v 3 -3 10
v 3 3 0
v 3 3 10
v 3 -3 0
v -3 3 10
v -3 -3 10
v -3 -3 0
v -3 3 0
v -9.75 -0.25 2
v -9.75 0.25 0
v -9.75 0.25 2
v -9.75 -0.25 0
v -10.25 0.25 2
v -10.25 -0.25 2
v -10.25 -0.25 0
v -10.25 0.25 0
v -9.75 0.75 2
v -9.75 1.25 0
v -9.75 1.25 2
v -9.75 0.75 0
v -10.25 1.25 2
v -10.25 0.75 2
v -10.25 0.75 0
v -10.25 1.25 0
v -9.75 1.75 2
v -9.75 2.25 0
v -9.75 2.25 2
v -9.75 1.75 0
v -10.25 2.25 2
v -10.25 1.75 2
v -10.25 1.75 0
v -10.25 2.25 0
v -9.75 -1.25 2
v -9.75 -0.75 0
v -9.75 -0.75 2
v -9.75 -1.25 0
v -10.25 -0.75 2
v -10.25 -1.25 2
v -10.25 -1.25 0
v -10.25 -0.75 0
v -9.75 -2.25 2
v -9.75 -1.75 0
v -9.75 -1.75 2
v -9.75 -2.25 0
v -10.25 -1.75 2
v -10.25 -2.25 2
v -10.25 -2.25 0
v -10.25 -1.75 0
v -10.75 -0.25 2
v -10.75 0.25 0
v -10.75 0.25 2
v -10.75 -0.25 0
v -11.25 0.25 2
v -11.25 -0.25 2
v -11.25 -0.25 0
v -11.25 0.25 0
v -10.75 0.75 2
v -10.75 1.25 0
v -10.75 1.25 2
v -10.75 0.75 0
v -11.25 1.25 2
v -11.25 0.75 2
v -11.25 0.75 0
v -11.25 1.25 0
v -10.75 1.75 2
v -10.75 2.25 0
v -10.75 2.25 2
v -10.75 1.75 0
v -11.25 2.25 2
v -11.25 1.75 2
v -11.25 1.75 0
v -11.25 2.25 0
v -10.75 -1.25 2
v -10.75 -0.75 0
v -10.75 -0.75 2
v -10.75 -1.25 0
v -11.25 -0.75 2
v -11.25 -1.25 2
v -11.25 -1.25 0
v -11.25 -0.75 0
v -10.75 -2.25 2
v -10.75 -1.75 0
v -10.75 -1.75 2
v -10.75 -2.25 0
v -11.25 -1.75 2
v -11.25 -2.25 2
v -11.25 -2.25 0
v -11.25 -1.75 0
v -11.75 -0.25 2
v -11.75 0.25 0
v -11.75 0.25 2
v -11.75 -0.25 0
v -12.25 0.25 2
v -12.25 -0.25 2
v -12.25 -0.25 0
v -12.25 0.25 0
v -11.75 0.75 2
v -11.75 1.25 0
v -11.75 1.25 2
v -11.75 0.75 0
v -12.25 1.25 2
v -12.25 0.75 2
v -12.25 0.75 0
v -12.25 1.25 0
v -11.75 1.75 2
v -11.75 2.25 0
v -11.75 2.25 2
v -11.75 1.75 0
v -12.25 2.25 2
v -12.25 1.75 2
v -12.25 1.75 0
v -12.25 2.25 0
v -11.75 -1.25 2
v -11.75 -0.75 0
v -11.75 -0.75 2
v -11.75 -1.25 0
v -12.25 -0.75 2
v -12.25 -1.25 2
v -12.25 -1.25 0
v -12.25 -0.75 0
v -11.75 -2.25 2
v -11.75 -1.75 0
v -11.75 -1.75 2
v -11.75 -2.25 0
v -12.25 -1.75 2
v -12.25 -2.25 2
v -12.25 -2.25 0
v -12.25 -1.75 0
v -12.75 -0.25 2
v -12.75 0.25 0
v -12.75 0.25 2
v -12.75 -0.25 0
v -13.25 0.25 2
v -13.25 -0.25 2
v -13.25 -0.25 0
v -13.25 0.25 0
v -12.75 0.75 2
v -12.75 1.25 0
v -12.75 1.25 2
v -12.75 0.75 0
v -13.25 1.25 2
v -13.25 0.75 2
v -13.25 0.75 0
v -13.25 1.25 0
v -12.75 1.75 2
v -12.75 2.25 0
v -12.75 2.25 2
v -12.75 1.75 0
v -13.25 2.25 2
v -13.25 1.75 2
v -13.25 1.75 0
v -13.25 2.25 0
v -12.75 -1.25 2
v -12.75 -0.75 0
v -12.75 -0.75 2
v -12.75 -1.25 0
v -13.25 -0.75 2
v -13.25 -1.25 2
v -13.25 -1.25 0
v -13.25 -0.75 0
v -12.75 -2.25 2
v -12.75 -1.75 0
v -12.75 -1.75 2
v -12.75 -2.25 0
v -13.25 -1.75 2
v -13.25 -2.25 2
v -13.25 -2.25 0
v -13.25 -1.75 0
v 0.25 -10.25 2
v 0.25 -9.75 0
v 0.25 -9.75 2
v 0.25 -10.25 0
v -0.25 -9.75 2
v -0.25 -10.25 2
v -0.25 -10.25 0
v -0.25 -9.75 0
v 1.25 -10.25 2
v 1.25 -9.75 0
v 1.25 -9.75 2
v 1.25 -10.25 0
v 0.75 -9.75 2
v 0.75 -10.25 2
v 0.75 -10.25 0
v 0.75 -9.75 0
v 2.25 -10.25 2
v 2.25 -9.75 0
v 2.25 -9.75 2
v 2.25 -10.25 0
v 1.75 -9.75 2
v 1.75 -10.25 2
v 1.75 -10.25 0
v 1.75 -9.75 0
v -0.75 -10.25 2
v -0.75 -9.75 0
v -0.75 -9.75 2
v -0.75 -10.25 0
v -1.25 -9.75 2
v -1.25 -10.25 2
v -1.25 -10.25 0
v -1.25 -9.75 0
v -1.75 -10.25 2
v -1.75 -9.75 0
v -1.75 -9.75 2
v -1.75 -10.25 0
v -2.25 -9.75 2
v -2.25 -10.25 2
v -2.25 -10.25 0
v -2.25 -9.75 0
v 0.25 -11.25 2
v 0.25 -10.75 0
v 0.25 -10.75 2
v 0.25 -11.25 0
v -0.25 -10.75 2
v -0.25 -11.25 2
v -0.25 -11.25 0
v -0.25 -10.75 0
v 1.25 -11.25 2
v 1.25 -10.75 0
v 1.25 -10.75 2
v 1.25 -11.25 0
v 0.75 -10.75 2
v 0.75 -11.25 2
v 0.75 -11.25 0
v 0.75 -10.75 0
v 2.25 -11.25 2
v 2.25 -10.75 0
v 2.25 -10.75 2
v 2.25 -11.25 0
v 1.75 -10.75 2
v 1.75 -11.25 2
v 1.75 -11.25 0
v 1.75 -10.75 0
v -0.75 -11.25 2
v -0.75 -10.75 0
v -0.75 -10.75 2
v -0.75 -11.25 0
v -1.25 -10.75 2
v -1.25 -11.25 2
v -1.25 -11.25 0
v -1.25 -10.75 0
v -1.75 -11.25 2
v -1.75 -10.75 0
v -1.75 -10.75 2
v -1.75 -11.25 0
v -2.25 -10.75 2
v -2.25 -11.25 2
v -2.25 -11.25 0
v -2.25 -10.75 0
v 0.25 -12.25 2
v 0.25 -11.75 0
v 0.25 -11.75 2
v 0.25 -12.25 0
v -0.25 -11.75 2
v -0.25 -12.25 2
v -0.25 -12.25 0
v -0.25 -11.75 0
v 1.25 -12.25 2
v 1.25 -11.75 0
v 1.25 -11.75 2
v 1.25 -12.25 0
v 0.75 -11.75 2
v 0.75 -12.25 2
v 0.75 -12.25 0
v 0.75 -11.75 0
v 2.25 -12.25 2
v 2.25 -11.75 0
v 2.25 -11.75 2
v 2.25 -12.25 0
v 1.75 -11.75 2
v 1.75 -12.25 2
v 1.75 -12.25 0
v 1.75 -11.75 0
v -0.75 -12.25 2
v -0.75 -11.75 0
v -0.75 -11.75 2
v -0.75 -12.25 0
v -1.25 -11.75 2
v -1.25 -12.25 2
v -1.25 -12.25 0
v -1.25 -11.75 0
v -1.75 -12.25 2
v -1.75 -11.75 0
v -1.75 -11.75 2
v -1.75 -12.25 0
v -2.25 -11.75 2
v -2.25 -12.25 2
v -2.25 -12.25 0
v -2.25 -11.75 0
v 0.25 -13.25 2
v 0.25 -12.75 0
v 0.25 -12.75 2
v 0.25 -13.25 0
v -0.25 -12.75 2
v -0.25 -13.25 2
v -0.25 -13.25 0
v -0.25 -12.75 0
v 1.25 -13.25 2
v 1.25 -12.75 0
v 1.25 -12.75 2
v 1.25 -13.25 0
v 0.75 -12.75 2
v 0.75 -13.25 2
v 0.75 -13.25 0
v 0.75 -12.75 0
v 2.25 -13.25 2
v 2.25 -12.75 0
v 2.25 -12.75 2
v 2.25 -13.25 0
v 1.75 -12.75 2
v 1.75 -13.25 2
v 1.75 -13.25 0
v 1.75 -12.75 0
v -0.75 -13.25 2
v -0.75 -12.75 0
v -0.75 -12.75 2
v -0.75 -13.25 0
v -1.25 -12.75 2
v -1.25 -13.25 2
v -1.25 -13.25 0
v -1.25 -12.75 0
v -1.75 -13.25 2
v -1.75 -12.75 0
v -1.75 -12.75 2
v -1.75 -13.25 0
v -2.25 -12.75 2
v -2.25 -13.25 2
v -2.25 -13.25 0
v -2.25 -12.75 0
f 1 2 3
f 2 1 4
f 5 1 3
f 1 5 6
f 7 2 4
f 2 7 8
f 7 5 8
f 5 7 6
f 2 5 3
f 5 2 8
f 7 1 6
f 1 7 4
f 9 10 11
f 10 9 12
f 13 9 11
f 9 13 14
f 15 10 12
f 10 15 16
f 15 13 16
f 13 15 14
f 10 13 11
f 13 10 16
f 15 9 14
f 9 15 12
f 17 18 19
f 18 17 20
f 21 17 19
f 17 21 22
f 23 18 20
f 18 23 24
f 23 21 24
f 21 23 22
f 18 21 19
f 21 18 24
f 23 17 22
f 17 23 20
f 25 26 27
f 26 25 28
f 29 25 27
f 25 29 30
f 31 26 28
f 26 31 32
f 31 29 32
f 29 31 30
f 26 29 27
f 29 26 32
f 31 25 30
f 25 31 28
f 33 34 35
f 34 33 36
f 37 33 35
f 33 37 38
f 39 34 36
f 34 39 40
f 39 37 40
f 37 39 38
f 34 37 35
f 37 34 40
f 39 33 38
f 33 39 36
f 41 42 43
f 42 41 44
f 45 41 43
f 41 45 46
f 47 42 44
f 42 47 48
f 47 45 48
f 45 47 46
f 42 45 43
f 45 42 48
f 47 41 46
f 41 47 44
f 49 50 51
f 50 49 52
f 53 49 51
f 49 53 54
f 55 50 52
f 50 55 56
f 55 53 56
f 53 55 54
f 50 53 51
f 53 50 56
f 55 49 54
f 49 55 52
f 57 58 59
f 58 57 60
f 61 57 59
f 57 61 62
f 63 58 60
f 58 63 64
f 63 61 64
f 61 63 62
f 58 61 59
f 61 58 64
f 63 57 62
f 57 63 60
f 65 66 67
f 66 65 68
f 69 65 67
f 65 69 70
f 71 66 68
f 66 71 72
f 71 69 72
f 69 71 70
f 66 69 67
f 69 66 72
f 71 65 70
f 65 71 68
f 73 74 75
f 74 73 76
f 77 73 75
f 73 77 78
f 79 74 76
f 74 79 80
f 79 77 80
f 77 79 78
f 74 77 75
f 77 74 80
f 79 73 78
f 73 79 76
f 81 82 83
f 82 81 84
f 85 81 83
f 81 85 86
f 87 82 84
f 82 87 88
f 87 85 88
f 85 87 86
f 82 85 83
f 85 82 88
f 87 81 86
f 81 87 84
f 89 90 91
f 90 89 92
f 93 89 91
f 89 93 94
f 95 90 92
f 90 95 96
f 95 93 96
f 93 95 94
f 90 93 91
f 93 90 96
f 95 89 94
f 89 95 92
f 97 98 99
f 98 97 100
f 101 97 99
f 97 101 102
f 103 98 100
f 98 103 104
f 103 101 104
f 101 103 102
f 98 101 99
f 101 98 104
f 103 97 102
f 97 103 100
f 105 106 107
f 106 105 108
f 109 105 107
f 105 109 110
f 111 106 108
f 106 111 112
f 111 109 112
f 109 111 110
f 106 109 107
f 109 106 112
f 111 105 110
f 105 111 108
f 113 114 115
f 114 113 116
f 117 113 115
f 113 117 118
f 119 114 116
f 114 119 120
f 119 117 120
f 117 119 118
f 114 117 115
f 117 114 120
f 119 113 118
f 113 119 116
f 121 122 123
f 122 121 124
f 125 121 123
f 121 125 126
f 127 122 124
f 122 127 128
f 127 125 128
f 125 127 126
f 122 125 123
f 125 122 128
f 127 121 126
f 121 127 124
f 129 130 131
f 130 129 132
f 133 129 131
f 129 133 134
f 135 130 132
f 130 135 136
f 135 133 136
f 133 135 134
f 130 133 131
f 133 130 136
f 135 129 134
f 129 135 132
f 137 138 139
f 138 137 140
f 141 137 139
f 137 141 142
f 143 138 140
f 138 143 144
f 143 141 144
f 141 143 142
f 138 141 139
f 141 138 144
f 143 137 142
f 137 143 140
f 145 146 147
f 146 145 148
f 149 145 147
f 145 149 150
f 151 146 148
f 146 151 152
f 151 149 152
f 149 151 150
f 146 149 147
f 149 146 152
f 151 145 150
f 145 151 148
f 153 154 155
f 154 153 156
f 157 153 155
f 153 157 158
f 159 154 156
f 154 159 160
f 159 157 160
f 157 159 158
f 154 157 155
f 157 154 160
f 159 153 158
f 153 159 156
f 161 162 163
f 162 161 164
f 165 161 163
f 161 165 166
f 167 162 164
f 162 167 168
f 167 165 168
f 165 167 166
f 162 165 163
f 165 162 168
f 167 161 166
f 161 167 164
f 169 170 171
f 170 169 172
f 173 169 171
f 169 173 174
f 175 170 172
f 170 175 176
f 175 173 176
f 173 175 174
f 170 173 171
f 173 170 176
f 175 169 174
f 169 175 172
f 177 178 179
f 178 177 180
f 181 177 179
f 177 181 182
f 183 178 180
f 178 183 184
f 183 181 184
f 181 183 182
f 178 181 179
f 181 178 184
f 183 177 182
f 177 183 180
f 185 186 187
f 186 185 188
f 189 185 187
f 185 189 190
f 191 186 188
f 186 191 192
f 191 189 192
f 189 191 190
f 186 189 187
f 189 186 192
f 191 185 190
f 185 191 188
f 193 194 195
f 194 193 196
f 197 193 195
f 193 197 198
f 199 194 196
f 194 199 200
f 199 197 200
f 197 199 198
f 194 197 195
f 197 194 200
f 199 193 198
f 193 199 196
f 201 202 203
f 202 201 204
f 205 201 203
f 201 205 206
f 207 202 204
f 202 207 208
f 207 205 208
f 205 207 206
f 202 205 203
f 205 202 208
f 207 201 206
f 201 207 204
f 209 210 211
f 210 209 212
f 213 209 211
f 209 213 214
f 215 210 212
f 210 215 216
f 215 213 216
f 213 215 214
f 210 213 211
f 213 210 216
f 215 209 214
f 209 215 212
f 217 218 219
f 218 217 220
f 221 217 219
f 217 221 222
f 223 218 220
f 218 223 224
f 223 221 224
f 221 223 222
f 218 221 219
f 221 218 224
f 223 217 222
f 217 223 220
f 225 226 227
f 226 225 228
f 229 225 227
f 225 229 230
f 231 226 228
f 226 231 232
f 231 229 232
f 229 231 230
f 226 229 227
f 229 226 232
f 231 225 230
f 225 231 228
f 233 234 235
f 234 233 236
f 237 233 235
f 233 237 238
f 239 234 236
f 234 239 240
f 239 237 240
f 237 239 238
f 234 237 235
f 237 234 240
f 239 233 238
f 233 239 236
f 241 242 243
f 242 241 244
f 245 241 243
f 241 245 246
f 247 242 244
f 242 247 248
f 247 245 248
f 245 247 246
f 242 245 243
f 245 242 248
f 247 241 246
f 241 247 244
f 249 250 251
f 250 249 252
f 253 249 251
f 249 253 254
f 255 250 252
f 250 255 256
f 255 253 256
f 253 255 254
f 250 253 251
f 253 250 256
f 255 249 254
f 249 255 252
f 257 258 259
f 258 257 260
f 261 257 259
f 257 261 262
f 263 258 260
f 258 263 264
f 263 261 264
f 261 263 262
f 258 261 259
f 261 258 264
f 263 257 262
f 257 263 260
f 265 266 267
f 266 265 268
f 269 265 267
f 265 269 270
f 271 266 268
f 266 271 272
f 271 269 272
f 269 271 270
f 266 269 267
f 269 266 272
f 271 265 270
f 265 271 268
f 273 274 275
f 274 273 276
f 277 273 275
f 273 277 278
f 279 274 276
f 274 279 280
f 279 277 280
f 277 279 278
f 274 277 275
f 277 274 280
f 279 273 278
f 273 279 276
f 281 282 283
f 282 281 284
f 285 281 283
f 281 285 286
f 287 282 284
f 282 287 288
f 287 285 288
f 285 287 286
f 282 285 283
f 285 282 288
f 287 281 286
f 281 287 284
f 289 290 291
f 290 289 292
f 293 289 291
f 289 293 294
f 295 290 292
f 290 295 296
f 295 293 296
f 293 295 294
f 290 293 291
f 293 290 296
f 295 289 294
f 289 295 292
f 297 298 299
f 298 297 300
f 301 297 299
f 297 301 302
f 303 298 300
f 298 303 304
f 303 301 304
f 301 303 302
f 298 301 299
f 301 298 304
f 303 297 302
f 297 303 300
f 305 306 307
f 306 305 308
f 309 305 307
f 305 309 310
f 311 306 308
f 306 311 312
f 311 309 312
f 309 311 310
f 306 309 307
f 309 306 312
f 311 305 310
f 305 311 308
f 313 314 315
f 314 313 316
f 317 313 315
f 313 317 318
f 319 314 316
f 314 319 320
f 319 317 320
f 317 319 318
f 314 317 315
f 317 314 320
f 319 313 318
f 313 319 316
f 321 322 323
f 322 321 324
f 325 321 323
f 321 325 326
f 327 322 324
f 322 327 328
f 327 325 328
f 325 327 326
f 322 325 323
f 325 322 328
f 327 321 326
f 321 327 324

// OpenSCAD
translate([0, 0, 5]) color([0,1,0,0.9]) cube([6, 6, 10], center=true);
translate([-10, 0, 1]) color([1,0,0]) cube([0.5, 0.5, 2], center=true);
translate([-10, 1, 1]) color([1,0,0]) cube([0.5, 0.5, 2], center=true);
translate([-10, 2, 1]) color([1,0,0]) cube([0.5, 0.5, 2], center=true);
translate([-10, -1, 1]) color([1,0,0]) cube([0.5, 0.5, 2], center=true);
translate([-10, -2, 1]) color([1,0,0]) cube([0.5, 0.5, 2], center=true);
translate([-11, 0, 1]) color([1,0,0]) cube([0.5, 0.5, 2], center=true);
translate([-11, 1, 1]) color([1,0,0]) cube([0.5, 0.5, 2], center=true);
translate([-11, 2, 1]) color([1,0,0]) cube([0.5, 0.5, 2], center=true);
translate([-11, -1, 1]) color([1,0,0]) cube([0.5, 0.5, 2], center=true);
translate([-11, -2, 1]) color([1,0,0]) cube([0.5, 0.5, 2], center=true);
translate([-12, 0, 1]) color([1,0,0]) cube([0.5, 0.5, 2], center=true);
translate([-12, 1, 1]) color([1,0,0]) cube([0.5, 0.5, 2], center=true);
translate([-12, 2, 1]) color([1,0,0]) cube([0.5, 0.5, 2], center=true);
translate([-12, -1, 1]) color([1,0,0]) cube([0.5, 0.5, 2], center=true);
translate([-12, -2, 1]) color([1,0,0]) cube([0.5, 0.5, 2], center=true);
translate([-13, 0, 1]) color([1,0,0]) cube([0.5, 0.5, 2], center=true);
translate([-13, 1, 1]) color([1,0,0]) cube([0.5, 0.5, 2], center=true);
translate([-13, 2, 1]) color([1,0,0]) cube([0.5, 0.5, 2], center=true);
translate([-13, -1, 1]) color([1,0,0]) cube([0.5, 0.5, 2], center=true);
translate([-13, -2, 1]) color([1,0,0]) cube([0.5, 0.5, 2], center=true);
translate([0, -10, 1]) color([1,0,0]) cube([0.5, 0.5, 2], center=true);
translate([1, -10, 1]) color([1,0,0]) cube([0.5, 0.5, 2], center=true);
translate([2, -10, 1]) color([1,0,0]) cube([0.5, 0.5, 2], center=true);
translate([-1, -10, 1]) color([1,0,0]) cube([0.5, 0.5, 2], center=true);
translate([-2, -10, 1]) color([1,0,0]) cube([0.5, 0.5, 2], center=true);
translate([0, -11, 1]) color([1,0,0]) cube([0.5, 0.5, 2], center=true);
translate([1, -11, 1]) color([1,0,0]) cube([0.5, 0.5, 2], center=true);
translate([2, -11, 1]) color([1,0,0]) cube([0.5, 0.5, 2], center=true);
translate([-1, -11, 1]) color([1,0,0]) cube([0.5, 0.5, 2], center=true);
translate([-2, -11, 1]) color([1,0,0]) cube([0.5, 0.5, 2], center=true);
translate([0, -12, 1]) color([1,0,0]) cube([0.5, 0.5, 2], center=true);
translate([1, -12, 1]) color([1,0,0]) cube([0.5, 0.5, 2], center=true);
translate([2, -12, 1]) color([1,0,0]) cube([0.5, 0.5, 2], center=true);
translate([-1, -12, 1]) color([1,0,0]) cube([0.5, 0.5, 2], center=true);
translate([-2, -12, 1]) color([1,0,0]) cube([0.5, 0.5, 2], center=true);
translate([0, -13, 1]) color([1,0,0]) cube([0.5, 0.5, 2], center=true);
translate([1, -13, 1]) color([1,0,0]) cube([0.5, 0.5, 2], center=true);
translate([2, -13, 1]) color([1,0,0]) cube([0.5, 0.5, 2], center=true);
translate([-1, -13, 1]) color([1,0,0]) cube([0.5, 0.5, 2], center=true);
translate([-2, -13, 1]) color([1,0,0]) cube([0.5, 0.5, 2], center=true);
